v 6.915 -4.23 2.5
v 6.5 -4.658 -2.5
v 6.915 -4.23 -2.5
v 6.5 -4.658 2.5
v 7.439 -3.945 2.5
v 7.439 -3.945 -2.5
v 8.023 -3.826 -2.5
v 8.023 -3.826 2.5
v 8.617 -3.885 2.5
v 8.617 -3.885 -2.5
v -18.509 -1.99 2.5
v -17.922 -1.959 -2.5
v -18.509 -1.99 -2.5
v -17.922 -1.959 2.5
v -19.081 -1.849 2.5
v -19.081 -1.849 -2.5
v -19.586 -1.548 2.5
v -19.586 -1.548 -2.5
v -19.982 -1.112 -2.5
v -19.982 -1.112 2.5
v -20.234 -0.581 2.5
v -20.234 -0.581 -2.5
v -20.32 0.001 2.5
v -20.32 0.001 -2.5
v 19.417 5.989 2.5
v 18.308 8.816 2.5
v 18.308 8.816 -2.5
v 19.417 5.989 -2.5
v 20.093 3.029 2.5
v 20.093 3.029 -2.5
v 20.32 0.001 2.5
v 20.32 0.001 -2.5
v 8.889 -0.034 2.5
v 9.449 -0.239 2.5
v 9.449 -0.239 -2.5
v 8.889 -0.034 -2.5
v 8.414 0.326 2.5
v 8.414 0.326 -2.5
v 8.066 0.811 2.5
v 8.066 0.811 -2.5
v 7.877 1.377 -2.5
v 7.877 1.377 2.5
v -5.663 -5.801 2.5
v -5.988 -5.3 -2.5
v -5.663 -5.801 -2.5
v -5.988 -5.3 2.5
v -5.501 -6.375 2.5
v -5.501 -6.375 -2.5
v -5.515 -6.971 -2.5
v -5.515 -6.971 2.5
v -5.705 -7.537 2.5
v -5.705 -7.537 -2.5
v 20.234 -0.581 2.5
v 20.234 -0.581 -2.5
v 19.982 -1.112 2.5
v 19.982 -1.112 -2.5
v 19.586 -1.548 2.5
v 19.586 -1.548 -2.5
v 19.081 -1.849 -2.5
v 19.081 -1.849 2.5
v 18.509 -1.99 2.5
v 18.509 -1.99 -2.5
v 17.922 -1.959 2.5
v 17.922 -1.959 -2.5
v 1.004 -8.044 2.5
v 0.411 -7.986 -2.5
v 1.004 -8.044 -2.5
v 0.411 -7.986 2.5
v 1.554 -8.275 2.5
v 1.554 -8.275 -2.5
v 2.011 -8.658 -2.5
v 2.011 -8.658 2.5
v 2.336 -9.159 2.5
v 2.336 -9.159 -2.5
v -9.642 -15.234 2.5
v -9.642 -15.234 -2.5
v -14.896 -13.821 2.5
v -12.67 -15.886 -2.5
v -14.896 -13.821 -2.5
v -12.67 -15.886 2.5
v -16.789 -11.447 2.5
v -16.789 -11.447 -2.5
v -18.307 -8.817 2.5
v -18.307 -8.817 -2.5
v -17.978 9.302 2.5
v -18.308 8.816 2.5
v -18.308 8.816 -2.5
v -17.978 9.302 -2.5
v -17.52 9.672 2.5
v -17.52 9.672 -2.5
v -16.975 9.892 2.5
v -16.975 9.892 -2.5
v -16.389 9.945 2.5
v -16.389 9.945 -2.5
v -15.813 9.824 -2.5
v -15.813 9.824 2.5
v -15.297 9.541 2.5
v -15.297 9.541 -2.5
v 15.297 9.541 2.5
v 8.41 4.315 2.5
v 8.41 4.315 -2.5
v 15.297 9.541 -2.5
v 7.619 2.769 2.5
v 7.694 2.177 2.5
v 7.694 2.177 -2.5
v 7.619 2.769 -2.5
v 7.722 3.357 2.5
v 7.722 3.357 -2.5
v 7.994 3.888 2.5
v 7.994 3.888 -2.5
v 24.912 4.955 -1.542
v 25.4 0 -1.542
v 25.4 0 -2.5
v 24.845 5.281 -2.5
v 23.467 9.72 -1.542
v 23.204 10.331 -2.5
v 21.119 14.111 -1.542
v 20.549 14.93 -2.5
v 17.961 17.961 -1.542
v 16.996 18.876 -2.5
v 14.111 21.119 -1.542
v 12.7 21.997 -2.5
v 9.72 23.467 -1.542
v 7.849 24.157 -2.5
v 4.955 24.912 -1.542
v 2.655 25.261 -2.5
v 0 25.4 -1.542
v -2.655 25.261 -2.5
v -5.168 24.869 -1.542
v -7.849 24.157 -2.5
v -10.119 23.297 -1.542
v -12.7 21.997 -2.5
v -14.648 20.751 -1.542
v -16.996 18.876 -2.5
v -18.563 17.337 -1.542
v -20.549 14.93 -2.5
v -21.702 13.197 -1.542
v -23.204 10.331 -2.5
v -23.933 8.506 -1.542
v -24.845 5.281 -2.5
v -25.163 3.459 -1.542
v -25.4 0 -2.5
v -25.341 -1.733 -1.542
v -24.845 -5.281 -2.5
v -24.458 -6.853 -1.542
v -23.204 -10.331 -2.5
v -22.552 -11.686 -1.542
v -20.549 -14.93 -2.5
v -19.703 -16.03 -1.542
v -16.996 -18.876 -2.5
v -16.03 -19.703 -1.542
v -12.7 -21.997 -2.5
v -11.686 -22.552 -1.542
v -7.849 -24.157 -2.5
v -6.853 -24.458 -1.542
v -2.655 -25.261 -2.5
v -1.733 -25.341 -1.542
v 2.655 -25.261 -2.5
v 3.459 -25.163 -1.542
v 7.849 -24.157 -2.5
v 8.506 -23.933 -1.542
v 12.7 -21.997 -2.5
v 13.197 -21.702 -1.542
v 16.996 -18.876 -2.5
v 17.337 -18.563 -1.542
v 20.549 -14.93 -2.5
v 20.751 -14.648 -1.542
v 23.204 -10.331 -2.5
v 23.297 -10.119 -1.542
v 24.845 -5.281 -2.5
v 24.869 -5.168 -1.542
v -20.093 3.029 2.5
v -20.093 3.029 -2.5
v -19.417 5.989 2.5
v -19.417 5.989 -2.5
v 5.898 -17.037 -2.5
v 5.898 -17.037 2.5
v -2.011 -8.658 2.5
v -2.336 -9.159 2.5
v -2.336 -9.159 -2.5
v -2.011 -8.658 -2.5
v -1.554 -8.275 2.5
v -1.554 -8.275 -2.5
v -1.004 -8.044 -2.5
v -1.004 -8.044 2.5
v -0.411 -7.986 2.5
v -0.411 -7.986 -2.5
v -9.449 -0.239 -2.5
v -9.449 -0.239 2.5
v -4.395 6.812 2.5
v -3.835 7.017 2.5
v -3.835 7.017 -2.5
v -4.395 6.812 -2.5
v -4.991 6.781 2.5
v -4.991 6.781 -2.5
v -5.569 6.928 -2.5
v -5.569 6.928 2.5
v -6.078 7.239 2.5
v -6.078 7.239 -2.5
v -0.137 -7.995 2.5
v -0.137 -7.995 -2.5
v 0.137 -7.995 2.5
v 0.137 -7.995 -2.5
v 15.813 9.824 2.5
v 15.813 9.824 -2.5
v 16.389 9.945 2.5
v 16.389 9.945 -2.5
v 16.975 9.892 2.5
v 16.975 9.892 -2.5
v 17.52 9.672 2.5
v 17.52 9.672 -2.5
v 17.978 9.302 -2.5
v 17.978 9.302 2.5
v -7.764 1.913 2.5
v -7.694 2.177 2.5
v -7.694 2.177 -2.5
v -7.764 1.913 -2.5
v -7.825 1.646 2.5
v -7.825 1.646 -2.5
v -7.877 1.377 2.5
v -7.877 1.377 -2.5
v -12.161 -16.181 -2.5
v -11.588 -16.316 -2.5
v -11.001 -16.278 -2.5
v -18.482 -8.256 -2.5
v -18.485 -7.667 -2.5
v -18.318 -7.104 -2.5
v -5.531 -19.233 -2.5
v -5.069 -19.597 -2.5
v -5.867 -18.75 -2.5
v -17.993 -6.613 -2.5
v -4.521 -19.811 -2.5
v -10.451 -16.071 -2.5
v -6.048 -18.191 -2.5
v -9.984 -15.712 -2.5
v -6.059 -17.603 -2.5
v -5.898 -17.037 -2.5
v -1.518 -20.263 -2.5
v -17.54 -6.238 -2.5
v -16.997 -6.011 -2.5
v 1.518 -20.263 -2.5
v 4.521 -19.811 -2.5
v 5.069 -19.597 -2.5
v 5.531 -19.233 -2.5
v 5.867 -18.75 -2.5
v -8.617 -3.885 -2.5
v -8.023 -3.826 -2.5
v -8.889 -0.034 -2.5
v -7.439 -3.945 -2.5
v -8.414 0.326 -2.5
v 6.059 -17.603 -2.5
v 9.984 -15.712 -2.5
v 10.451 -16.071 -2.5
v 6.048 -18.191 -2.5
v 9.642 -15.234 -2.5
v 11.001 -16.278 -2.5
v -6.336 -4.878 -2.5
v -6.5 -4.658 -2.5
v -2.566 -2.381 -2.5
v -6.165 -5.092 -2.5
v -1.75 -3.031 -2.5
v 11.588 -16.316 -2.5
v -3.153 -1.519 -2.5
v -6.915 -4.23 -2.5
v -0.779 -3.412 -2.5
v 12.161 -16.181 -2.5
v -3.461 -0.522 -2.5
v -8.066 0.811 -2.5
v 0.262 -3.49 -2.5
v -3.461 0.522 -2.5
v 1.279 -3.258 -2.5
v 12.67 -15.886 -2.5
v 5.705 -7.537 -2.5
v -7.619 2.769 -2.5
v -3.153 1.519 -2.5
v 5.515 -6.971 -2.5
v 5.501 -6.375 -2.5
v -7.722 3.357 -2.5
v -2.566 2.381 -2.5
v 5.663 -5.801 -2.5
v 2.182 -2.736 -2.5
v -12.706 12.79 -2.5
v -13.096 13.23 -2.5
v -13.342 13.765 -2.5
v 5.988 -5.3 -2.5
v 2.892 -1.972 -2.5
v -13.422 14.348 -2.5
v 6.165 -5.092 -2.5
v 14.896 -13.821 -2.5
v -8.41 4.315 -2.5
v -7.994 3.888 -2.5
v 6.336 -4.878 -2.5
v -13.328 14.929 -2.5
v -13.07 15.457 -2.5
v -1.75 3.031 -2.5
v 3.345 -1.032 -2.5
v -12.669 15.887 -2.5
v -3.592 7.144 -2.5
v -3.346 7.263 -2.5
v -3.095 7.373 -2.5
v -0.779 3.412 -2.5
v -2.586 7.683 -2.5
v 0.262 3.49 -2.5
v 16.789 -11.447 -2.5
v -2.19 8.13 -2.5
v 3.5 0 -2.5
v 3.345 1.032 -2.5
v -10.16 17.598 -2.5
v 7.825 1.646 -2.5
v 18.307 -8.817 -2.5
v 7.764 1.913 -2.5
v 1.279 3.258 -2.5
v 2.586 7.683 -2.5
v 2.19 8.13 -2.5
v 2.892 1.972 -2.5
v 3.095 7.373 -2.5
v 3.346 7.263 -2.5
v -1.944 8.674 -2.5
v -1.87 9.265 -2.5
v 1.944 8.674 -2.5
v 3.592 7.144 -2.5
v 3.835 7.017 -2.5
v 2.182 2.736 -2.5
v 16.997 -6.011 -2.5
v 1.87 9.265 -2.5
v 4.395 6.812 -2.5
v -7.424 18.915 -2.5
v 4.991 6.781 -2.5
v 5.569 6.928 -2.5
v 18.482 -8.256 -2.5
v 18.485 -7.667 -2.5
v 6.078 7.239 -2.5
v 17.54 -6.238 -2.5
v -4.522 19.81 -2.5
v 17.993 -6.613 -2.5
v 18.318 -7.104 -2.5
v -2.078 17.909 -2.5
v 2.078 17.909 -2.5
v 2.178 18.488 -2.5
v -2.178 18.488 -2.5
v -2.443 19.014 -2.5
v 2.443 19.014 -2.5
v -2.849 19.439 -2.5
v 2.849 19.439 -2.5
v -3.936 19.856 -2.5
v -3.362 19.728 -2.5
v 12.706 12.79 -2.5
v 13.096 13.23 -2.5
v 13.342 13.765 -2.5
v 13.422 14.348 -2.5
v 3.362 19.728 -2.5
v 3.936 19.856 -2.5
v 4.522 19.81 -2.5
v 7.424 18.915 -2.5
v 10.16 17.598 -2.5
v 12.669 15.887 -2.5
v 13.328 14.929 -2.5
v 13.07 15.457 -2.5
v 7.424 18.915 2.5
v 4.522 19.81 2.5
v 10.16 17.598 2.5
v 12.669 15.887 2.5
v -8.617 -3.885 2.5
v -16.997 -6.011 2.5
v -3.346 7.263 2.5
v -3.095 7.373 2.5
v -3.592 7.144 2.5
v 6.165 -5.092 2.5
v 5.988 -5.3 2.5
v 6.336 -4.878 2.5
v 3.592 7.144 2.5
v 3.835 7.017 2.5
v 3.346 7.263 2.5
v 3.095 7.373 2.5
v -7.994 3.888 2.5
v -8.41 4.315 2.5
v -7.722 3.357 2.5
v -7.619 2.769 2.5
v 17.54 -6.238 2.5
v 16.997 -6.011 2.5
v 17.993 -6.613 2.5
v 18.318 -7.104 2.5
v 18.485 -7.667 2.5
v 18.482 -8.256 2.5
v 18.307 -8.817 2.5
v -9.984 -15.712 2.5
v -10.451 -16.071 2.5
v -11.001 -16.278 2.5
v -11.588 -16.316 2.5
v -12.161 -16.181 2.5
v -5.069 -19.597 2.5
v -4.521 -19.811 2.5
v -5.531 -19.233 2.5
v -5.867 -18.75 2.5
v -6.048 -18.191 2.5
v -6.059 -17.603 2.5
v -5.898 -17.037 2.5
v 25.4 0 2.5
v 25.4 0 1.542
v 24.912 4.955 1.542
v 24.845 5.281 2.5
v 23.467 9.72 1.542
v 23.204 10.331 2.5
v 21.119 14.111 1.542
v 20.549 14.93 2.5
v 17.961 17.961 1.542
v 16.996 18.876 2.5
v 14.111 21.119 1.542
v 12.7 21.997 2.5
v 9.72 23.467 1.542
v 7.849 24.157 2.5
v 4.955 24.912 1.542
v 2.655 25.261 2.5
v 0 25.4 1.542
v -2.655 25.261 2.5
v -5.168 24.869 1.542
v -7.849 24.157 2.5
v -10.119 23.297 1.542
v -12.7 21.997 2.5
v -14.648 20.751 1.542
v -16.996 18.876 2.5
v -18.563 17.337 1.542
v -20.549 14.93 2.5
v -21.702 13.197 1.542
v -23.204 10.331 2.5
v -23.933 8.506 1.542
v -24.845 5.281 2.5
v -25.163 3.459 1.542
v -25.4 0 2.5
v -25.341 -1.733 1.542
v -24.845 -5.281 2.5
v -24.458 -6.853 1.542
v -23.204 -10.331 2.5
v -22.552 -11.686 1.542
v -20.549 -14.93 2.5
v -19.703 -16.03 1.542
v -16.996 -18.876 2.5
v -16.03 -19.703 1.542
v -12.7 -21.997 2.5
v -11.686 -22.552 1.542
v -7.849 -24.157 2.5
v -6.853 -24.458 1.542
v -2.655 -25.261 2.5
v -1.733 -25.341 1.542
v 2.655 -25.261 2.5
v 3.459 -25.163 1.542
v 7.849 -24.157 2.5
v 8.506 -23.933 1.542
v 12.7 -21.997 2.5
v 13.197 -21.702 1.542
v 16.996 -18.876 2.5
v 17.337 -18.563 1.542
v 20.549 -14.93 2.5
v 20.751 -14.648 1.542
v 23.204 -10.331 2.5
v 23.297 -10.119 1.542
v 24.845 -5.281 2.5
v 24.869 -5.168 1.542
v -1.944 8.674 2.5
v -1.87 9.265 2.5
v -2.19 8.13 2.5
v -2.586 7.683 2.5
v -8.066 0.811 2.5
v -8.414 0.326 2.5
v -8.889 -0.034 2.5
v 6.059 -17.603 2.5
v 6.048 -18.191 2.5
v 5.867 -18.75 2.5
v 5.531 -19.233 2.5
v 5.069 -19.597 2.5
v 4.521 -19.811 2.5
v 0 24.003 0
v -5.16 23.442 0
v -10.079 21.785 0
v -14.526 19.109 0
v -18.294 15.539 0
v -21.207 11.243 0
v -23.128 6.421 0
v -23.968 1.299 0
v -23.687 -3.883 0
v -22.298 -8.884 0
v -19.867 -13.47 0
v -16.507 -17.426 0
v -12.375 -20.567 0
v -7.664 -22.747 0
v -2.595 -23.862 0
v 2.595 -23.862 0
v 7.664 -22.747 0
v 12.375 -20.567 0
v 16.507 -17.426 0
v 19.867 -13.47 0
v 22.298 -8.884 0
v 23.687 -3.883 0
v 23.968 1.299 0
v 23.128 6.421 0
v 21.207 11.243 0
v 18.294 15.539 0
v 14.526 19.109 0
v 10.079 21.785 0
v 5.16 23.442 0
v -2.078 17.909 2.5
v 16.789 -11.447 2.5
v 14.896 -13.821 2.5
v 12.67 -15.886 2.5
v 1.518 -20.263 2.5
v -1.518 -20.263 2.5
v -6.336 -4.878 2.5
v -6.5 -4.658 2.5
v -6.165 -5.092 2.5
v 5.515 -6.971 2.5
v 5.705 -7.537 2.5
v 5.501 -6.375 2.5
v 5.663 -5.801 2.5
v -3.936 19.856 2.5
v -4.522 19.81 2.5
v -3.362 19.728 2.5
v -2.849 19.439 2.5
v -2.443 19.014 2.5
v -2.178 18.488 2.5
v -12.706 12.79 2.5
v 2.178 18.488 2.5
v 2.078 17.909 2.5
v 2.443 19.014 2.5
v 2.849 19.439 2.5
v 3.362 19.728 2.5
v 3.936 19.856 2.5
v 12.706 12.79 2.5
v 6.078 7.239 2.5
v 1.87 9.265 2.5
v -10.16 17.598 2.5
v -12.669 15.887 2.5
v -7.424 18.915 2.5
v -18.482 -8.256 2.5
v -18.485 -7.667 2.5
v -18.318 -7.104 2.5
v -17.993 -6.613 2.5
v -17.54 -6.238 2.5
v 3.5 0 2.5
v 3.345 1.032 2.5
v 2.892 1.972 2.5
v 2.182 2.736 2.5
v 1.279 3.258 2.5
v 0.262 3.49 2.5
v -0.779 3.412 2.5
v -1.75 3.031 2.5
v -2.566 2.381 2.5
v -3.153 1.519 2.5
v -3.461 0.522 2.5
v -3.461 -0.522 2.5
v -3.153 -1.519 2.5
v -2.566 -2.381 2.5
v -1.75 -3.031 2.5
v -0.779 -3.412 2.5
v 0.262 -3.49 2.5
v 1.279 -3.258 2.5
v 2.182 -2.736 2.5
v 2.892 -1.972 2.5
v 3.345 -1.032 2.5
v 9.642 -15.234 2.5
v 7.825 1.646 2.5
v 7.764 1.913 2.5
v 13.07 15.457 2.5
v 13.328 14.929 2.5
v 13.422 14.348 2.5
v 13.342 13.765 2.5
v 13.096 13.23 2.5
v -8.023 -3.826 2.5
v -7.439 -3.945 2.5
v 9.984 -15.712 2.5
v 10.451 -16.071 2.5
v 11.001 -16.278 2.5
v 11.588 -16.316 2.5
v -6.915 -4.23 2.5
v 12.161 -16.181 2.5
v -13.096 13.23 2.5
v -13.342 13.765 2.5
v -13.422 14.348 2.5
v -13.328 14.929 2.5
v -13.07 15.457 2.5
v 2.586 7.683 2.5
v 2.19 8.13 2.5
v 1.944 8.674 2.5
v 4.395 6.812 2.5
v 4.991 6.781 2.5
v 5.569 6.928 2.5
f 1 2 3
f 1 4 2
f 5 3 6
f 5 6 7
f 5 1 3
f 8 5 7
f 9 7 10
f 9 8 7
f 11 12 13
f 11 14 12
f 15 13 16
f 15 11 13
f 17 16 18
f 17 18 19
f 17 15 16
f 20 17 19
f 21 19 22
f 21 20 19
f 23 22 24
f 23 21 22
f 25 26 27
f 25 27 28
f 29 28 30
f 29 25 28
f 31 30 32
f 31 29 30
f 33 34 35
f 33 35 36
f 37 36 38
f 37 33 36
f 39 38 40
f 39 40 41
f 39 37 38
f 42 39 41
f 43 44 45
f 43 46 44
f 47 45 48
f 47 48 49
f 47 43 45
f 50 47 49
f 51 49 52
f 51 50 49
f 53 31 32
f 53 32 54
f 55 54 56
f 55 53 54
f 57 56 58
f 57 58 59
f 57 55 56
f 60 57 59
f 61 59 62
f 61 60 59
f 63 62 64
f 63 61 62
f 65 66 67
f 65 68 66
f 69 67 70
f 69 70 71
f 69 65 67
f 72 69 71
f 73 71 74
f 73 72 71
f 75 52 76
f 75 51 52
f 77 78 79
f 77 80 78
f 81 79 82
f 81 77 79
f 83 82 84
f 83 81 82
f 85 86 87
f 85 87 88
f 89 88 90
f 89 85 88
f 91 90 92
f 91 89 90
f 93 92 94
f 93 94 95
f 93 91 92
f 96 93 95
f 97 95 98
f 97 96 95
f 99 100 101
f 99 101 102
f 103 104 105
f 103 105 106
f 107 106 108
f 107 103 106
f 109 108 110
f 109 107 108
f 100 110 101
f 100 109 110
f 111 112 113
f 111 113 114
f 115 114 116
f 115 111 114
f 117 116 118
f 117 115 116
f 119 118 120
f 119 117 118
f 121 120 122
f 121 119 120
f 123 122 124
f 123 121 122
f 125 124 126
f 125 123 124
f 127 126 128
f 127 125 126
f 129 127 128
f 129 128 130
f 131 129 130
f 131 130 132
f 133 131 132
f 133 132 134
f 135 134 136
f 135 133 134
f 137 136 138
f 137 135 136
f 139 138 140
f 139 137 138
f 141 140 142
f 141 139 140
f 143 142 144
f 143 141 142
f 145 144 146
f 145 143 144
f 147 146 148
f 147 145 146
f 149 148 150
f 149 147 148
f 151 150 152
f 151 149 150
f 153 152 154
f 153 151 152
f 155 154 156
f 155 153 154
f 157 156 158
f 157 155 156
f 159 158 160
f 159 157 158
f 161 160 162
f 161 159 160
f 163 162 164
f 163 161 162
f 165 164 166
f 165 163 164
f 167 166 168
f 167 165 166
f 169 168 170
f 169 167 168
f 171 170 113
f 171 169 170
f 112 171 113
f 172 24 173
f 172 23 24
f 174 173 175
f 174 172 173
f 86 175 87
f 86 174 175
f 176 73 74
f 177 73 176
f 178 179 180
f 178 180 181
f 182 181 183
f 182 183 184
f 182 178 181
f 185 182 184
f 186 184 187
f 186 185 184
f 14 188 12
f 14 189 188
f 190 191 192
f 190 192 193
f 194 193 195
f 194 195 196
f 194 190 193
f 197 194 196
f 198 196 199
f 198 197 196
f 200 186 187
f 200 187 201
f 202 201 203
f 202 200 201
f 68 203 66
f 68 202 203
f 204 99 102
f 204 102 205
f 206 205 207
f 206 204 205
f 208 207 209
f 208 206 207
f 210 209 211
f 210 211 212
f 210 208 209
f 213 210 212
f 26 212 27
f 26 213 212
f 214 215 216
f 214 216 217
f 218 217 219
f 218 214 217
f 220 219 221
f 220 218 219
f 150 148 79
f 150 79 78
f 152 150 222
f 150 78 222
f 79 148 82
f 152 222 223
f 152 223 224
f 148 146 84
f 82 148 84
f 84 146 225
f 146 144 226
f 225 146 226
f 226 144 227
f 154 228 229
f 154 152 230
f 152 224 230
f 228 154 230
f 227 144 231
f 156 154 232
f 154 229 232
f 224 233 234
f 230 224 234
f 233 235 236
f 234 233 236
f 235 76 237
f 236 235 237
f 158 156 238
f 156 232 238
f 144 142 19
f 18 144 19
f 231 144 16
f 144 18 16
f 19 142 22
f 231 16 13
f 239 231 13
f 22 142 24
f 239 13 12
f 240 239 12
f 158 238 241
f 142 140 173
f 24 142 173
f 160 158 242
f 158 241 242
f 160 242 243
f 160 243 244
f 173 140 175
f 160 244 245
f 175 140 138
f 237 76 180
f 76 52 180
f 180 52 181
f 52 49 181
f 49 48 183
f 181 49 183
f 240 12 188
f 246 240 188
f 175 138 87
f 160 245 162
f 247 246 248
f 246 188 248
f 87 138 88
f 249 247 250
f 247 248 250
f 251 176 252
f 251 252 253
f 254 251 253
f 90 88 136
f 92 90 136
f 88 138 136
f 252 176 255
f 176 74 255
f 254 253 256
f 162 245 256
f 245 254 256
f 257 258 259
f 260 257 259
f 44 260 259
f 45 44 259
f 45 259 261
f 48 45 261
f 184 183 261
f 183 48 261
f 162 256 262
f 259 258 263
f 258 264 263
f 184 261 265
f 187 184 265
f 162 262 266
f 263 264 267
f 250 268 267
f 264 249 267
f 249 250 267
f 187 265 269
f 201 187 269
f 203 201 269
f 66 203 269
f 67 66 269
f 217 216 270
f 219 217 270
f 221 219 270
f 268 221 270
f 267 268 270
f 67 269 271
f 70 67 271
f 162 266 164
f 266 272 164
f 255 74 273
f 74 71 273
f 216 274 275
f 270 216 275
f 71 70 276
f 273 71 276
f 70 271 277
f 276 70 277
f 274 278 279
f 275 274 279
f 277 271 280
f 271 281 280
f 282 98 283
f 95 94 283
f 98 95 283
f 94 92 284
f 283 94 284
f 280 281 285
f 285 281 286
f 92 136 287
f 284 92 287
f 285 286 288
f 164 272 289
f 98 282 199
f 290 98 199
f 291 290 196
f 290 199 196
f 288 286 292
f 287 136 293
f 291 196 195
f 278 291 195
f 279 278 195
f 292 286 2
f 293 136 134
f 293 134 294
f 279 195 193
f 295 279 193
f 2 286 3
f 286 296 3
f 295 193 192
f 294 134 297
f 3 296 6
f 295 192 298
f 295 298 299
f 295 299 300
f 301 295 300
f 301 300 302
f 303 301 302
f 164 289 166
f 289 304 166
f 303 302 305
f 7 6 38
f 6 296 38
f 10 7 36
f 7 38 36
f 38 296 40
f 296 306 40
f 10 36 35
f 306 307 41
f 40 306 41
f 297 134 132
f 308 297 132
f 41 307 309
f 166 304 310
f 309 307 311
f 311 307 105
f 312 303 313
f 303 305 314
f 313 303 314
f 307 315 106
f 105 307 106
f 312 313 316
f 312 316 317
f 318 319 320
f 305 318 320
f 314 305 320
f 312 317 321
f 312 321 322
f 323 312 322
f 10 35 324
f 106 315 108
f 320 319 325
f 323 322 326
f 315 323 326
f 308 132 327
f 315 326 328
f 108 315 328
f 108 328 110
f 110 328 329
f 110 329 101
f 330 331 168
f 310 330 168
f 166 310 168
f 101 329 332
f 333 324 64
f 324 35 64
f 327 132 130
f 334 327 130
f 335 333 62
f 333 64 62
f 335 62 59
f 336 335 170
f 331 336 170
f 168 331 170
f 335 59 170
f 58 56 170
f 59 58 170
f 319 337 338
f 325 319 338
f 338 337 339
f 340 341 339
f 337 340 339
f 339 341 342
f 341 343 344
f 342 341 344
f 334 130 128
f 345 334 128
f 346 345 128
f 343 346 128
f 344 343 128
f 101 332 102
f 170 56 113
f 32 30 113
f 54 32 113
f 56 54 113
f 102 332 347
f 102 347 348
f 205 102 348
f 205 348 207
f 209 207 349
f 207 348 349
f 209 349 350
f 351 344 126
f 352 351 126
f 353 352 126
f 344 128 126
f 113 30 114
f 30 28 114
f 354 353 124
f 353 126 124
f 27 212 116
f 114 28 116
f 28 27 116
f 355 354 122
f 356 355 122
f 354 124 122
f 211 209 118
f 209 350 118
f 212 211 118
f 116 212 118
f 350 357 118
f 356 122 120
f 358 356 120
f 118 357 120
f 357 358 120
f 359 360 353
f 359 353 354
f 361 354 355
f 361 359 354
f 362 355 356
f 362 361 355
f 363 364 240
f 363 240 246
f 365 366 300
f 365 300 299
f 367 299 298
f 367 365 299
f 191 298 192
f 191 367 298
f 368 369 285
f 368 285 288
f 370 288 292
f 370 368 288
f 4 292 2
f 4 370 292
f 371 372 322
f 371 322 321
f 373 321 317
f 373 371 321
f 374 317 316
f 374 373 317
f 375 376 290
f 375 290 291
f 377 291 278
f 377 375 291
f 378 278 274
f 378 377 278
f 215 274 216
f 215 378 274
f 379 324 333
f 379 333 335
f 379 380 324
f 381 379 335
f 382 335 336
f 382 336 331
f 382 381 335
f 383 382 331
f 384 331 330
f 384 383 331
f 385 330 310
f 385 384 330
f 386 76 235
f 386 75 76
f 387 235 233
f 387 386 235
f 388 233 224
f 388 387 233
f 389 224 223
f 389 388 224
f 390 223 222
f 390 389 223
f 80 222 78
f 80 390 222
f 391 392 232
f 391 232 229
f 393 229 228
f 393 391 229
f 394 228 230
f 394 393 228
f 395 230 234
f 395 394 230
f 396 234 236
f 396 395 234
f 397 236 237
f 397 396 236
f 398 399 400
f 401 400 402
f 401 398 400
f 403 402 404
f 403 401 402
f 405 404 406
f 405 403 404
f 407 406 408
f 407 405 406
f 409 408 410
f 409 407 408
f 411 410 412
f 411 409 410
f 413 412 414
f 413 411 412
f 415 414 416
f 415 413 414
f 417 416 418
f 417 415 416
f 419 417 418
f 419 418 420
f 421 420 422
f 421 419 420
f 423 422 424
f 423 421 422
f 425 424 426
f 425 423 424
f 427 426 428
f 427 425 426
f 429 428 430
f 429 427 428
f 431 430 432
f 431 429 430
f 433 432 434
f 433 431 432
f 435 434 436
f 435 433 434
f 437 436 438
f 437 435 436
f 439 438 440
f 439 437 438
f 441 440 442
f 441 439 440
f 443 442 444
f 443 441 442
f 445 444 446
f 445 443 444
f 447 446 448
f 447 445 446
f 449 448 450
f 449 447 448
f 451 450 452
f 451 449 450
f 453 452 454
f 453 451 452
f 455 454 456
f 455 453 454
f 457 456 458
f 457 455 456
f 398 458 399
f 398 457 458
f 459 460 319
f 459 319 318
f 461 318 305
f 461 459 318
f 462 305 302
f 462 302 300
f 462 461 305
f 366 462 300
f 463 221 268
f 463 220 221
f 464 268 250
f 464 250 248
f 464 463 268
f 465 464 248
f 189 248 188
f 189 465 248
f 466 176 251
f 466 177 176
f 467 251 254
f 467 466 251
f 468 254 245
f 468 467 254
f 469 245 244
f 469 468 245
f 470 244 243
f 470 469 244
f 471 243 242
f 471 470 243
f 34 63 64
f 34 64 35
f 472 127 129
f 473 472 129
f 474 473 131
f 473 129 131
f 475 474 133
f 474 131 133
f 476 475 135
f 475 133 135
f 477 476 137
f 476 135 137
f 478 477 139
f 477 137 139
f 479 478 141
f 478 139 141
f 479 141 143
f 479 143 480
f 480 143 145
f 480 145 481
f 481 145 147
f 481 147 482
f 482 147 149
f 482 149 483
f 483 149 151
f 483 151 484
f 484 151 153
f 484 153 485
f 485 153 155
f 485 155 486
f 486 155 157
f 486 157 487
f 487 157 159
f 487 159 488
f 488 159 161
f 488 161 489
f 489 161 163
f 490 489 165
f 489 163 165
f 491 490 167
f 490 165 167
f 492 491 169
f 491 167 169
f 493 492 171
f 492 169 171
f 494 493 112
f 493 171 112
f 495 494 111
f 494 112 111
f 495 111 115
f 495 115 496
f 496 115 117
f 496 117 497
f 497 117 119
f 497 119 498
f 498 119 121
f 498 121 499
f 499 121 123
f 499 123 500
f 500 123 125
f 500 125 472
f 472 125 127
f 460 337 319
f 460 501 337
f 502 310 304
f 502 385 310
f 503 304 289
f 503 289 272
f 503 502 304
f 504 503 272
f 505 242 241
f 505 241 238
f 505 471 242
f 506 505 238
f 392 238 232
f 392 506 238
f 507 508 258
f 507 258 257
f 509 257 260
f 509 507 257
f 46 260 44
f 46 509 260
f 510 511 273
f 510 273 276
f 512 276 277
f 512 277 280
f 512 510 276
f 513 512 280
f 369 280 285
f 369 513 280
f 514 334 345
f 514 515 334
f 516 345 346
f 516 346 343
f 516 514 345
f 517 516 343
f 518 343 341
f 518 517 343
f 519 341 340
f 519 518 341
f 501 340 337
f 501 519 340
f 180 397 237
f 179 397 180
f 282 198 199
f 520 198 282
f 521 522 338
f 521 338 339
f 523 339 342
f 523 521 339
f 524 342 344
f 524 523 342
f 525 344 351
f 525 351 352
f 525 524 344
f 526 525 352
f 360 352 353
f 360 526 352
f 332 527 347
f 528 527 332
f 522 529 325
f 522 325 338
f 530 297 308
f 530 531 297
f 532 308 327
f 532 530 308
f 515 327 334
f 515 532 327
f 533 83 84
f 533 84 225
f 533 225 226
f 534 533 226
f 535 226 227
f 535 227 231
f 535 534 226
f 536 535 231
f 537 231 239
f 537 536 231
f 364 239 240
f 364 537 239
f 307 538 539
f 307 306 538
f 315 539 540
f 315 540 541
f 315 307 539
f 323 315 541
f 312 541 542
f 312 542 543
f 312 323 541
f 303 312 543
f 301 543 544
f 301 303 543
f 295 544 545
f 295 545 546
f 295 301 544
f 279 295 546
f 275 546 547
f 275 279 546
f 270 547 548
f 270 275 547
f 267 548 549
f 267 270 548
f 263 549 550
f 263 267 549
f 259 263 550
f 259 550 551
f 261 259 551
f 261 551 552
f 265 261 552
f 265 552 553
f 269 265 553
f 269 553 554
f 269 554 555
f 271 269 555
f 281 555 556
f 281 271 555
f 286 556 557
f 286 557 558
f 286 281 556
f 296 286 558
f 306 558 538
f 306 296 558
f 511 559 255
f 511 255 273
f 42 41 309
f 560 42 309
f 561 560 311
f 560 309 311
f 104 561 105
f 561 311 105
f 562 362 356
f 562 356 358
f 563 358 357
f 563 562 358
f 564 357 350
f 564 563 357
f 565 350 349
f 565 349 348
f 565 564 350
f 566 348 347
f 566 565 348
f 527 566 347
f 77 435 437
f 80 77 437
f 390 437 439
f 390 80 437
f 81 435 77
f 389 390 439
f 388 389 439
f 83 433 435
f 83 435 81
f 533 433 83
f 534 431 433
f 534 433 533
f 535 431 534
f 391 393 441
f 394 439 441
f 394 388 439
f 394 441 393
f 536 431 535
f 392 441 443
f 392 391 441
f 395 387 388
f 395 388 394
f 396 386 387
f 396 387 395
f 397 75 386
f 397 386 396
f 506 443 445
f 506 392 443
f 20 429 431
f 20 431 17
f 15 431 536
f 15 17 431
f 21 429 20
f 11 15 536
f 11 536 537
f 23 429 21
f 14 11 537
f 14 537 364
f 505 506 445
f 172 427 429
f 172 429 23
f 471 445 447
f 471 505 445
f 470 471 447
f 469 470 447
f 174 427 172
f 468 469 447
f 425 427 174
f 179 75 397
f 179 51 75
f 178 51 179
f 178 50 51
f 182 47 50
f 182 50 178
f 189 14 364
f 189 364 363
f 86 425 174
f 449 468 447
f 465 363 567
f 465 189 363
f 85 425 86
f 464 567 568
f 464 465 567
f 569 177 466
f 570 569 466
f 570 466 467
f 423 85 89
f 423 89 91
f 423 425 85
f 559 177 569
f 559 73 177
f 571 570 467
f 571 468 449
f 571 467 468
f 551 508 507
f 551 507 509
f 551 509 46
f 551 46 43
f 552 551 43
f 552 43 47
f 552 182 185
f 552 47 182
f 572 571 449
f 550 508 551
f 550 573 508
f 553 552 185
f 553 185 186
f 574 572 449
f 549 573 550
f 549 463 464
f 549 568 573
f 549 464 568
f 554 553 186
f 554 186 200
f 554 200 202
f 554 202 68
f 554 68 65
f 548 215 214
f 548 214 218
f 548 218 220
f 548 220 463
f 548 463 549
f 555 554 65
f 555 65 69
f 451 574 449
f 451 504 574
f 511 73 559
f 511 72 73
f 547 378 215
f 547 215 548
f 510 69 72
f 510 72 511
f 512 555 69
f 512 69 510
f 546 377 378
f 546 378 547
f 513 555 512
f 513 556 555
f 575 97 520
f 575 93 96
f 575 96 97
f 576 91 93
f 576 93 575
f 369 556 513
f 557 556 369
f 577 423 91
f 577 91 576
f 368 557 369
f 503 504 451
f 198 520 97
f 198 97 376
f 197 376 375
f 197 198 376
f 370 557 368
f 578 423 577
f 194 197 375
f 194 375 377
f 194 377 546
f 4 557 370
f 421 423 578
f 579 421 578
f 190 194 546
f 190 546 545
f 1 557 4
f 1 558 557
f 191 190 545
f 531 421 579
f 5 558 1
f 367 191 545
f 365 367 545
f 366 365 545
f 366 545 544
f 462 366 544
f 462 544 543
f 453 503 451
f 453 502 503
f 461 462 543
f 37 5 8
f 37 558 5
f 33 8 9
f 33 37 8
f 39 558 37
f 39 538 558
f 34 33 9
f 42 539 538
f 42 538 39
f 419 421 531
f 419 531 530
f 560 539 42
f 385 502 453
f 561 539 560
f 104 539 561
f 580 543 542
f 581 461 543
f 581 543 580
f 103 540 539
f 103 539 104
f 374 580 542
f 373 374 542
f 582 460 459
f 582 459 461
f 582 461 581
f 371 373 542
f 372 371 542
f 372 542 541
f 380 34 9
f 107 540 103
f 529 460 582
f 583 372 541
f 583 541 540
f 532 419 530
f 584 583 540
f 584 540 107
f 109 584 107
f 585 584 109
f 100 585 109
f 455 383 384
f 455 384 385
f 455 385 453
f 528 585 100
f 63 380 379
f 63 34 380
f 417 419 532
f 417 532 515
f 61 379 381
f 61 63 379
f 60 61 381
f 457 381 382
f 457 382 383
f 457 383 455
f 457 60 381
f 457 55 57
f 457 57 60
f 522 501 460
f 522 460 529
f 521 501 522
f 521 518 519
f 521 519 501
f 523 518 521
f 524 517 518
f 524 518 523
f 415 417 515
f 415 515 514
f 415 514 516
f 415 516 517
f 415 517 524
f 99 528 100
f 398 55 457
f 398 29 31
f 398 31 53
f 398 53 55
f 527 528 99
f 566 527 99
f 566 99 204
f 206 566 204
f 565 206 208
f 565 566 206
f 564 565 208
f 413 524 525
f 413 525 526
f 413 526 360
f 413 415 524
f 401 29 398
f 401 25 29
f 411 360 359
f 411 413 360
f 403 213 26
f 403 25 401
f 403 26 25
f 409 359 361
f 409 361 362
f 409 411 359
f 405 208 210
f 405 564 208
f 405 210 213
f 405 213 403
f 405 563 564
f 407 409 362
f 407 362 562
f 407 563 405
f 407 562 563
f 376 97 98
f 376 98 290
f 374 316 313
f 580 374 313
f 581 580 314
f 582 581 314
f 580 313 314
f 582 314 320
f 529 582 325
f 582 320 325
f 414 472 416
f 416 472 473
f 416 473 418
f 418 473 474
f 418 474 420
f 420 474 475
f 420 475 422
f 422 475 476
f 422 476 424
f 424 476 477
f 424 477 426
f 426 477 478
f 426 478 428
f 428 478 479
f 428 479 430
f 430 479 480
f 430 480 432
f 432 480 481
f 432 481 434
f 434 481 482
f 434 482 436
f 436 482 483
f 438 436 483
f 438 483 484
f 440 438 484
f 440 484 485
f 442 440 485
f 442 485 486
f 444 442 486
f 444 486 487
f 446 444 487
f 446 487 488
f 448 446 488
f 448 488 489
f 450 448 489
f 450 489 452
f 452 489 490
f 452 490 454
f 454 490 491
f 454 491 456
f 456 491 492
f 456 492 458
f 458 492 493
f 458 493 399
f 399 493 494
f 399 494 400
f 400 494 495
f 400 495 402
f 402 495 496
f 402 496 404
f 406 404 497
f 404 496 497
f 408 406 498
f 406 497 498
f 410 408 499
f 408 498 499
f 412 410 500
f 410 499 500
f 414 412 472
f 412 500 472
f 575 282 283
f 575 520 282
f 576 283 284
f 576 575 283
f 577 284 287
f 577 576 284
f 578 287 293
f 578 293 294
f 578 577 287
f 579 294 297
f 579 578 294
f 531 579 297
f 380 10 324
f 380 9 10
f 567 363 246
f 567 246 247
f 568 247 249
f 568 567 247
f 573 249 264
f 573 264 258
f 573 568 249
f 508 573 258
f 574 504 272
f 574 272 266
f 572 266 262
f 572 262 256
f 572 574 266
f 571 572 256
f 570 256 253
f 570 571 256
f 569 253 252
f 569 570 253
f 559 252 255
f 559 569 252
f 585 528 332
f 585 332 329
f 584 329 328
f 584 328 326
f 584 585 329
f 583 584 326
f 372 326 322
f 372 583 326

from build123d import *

# Parameters (mm, degrees)
F0_R     = 25.4
F0_R_2   = 3.5
F1_DEPTH = 2.5


with BuildPart() as f1:
    # F0 (on Top) → F1 (new body, symmetric)
    with BuildSketch(Plane.XY):
        Circle(F0_R)
        with BuildLine():
            ThreePointArc((-4.520769, -19.810731), (-5.867147, -18.750304), (-5.898131, -17.036747))
            Line((-5.898131, -17.036747), (-2.335578, -9.159014))
            ThreePointArc((-2.335578, -9.159014), (-1.55413, -8.27532), (-0.41057, -7.98576))
            ThreePointArc((-0.41057, -7.98576), (0, -7.996308), (0.41057, -7.98576))
            ThreePointArc((0.41057, -7.98576), (1.55413, -8.27532), (2.335578, -9.159014))
            Line((2.335578, -9.159014), (5.898131, -17.036747))
            ThreePointArc((5.898131, -17.036747), (5.867147, -18.750304), (4.520769, -19.810731))
            ThreePointArc((4.520769, -19.810731), (0, -20.32), (-4.520769, -19.810731))
        make_face(mode=Mode.SUBTRACT)
        with BuildLine():
            ThreePointArc((-18.307306, -8.817309), (-18.317684, -7.103503), (-16.997289, -6.010894))
            Line((-16.997289, -6.010894), (-8.617015, -3.884523))
            ThreePointArc((-8.617015, -3.884523), (-7.43889, -3.94451), (-6.499505, -4.658044))
            ThreePointArc((-6.499505, -4.658044), (-6.251765, -4.985616), (-5.987533, -5.300037))
            ThreePointArc((-5.987533, -5.300037), (-5.500922, -6.374646), (-5.704596, -7.53658))
            Line((-5.704596, -7.53658), (-9.642441, -15.233582))
            ThreePointArc((-9.642441, -15.233582), (-11.001472, -16.277743), (-12.669999, -15.886268))
            ThreePointArc((-12.669999, -15.886268), (-15.886816, -12.669313), (-18.307306, -8.817309))
        make_face(mode=Mode.SUBTRACT)
        Circle(F0_R_2, mode=Mode.SUBTRACT)
        with BuildLine():
            ThreePointArc((12.669999, -15.886268), (11.001472, -16.277743), (9.642441, -15.233582))
            Line((9.642441, -15.233582), (5.704596, -7.53658))
            ThreePointArc((5.704596, -7.53658), (5.500922, -6.374646), (5.987533, -5.300037))
            ThreePointArc((5.987533, -5.300037), (6.251765, -4.985616), (6.499505, -4.658044))
            ThreePointArc((6.499505, -4.658044), (7.43889, -3.94451), (8.617015, -3.884523))
            Line((8.617015, -3.884523), (16.997289, -6.010894))
            ThreePointArc((16.997289, -6.010894), (18.317684, -7.103503), (18.307306, -8.817309))
            ThreePointArc((18.307306, -8.817309), (15.886816, -12.669313), (12.669999, -15.886268))
        make_face(mode=Mode.SUBTRACT)
        with BuildLine():
            ThreePointArc((-18.308068, 8.815727), (-16.974632, 9.89238), (-15.297143, 9.541285))
            Line((-15.297143, 9.541285), (-8.409663, 4.315093))
            ThreePointArc((-8.409663, 4.315093), (-7.722014, 3.356597), (-7.69418, 2.177275))
            ThreePointArc((-7.69418, 2.177275), (-7.795824, 1.779346), (-7.876901, 1.376723))
            ThreePointArc((-7.876901, 1.376723), (-8.413667, 0.326267), (-9.449094, -0.238948))
            Line((-9.449094, -0.238948), (-17.922058, -1.959219))
            ThreePointArc((-17.922058, -1.959219), (-19.585758, -1.54771), (-20.32, 0.000878))
            ThreePointArc((-20.32, 0.000878), (-19.810535, 4.521625), (-18.308068, 8.815727))
        make_face(mode=Mode.SUBTRACT)
        with BuildLine():
            ThreePointArc((-1.869664, 9.265356), (-2.190304, 8.130118), (-3.094981, 7.373061))
            ThreePointArc((-3.094981, 7.373061), (-3.469468, 7.204424), (-3.834802, 7.016782))
            ThreePointArc((-3.834802, 7.016782), (-4.99075, 6.781494), (-6.078231, 7.238617))
            Line((-6.078231, 7.238617), (-12.706, 12.790476))
            ThreePointArc((-12.706, 12.790476), (-13.421569, 14.34778), (-12.668626, 15.887363))
            ThreePointArc((-12.668626, 15.887363), (-8.816518, 18.307687), (-4.522481, 19.81034))
            ThreePointArc((-4.522481, 19.81034), (-2.849335, 19.4391), (-2.077936, 17.908682))
            Line((-2.077936, 17.908682), (-1.869664, 9.265356))
        make_face(mode=Mode.SUBTRACT)
        with BuildLine():
            ThreePointArc((20.32, 0.000878), (19.585758, -1.54771), (17.922058, -1.959219))
            Line((17.922058, -1.959219), (9.449094, -0.238948))
            ThreePointArc((9.449094, -0.238948), (8.413667, 0.326267), (7.876901, 1.376723))
            ThreePointArc((7.876901, 1.376723), (7.795824, 1.779346), (7.69418, 2.177275))
            ThreePointArc((7.69418, 2.177275), (7.722014, 3.356597), (8.409663, 4.315093))
            Line((8.409663, 4.315093), (15.297143, 9.541285))
            ThreePointArc((15.297143, 9.541285), (16.974632, 9.89238), (18.308068, 8.815727))
            ThreePointArc((18.308068, 8.815727), (19.810535, 4.521625), (20.32, 0.000878))
        make_face(mode=Mode.SUBTRACT)
        with BuildLine():
            ThreePointArc((3.094981, 7.373061), (2.190304, 8.130118), (1.869664, 9.265356))
            Line((1.869664, 9.265356), (2.077936, 17.908682))
            ThreePointArc((2.077936, 17.908682), (2.849335, 19.4391), (4.522481, 19.81034))
            ThreePointArc((4.522481, 19.81034), (8.816518, 18.307687), (12.668626, 15.887363))
            ThreePointArc((12.668626, 15.887363), (13.421569, 14.34778), (12.706, 12.790476))
            Line((12.706, 12.790476), (6.078231, 7.238617))
            ThreePointArc((6.078231, 7.238617), (4.99075, 6.781494), (3.834802, 7.016782))
            ThreePointArc((3.834802, 7.016782), (3.469468, 7.204424), (3.094981, 7.373061))
        make_face(mode=Mode.SUBTRACT)
    extrude(amount=F1_DEPTH, both=True)

    # F2 (on Right) → F3 (revolve, cut)
    with BuildSketch(Plane.YZ):
        Polygon((25.408719, -1.552115), (25.503, 0), (24.003, 0), align=None)
        Polygon((24.003, 0), (25.503, 0), (25.408719, 1.552115), align=None)
    revolve(axis=Axis((0, 0, 1.759876), (0, 0, 1)), mode=Mode.SUBTRACT)


solid = f1.part
